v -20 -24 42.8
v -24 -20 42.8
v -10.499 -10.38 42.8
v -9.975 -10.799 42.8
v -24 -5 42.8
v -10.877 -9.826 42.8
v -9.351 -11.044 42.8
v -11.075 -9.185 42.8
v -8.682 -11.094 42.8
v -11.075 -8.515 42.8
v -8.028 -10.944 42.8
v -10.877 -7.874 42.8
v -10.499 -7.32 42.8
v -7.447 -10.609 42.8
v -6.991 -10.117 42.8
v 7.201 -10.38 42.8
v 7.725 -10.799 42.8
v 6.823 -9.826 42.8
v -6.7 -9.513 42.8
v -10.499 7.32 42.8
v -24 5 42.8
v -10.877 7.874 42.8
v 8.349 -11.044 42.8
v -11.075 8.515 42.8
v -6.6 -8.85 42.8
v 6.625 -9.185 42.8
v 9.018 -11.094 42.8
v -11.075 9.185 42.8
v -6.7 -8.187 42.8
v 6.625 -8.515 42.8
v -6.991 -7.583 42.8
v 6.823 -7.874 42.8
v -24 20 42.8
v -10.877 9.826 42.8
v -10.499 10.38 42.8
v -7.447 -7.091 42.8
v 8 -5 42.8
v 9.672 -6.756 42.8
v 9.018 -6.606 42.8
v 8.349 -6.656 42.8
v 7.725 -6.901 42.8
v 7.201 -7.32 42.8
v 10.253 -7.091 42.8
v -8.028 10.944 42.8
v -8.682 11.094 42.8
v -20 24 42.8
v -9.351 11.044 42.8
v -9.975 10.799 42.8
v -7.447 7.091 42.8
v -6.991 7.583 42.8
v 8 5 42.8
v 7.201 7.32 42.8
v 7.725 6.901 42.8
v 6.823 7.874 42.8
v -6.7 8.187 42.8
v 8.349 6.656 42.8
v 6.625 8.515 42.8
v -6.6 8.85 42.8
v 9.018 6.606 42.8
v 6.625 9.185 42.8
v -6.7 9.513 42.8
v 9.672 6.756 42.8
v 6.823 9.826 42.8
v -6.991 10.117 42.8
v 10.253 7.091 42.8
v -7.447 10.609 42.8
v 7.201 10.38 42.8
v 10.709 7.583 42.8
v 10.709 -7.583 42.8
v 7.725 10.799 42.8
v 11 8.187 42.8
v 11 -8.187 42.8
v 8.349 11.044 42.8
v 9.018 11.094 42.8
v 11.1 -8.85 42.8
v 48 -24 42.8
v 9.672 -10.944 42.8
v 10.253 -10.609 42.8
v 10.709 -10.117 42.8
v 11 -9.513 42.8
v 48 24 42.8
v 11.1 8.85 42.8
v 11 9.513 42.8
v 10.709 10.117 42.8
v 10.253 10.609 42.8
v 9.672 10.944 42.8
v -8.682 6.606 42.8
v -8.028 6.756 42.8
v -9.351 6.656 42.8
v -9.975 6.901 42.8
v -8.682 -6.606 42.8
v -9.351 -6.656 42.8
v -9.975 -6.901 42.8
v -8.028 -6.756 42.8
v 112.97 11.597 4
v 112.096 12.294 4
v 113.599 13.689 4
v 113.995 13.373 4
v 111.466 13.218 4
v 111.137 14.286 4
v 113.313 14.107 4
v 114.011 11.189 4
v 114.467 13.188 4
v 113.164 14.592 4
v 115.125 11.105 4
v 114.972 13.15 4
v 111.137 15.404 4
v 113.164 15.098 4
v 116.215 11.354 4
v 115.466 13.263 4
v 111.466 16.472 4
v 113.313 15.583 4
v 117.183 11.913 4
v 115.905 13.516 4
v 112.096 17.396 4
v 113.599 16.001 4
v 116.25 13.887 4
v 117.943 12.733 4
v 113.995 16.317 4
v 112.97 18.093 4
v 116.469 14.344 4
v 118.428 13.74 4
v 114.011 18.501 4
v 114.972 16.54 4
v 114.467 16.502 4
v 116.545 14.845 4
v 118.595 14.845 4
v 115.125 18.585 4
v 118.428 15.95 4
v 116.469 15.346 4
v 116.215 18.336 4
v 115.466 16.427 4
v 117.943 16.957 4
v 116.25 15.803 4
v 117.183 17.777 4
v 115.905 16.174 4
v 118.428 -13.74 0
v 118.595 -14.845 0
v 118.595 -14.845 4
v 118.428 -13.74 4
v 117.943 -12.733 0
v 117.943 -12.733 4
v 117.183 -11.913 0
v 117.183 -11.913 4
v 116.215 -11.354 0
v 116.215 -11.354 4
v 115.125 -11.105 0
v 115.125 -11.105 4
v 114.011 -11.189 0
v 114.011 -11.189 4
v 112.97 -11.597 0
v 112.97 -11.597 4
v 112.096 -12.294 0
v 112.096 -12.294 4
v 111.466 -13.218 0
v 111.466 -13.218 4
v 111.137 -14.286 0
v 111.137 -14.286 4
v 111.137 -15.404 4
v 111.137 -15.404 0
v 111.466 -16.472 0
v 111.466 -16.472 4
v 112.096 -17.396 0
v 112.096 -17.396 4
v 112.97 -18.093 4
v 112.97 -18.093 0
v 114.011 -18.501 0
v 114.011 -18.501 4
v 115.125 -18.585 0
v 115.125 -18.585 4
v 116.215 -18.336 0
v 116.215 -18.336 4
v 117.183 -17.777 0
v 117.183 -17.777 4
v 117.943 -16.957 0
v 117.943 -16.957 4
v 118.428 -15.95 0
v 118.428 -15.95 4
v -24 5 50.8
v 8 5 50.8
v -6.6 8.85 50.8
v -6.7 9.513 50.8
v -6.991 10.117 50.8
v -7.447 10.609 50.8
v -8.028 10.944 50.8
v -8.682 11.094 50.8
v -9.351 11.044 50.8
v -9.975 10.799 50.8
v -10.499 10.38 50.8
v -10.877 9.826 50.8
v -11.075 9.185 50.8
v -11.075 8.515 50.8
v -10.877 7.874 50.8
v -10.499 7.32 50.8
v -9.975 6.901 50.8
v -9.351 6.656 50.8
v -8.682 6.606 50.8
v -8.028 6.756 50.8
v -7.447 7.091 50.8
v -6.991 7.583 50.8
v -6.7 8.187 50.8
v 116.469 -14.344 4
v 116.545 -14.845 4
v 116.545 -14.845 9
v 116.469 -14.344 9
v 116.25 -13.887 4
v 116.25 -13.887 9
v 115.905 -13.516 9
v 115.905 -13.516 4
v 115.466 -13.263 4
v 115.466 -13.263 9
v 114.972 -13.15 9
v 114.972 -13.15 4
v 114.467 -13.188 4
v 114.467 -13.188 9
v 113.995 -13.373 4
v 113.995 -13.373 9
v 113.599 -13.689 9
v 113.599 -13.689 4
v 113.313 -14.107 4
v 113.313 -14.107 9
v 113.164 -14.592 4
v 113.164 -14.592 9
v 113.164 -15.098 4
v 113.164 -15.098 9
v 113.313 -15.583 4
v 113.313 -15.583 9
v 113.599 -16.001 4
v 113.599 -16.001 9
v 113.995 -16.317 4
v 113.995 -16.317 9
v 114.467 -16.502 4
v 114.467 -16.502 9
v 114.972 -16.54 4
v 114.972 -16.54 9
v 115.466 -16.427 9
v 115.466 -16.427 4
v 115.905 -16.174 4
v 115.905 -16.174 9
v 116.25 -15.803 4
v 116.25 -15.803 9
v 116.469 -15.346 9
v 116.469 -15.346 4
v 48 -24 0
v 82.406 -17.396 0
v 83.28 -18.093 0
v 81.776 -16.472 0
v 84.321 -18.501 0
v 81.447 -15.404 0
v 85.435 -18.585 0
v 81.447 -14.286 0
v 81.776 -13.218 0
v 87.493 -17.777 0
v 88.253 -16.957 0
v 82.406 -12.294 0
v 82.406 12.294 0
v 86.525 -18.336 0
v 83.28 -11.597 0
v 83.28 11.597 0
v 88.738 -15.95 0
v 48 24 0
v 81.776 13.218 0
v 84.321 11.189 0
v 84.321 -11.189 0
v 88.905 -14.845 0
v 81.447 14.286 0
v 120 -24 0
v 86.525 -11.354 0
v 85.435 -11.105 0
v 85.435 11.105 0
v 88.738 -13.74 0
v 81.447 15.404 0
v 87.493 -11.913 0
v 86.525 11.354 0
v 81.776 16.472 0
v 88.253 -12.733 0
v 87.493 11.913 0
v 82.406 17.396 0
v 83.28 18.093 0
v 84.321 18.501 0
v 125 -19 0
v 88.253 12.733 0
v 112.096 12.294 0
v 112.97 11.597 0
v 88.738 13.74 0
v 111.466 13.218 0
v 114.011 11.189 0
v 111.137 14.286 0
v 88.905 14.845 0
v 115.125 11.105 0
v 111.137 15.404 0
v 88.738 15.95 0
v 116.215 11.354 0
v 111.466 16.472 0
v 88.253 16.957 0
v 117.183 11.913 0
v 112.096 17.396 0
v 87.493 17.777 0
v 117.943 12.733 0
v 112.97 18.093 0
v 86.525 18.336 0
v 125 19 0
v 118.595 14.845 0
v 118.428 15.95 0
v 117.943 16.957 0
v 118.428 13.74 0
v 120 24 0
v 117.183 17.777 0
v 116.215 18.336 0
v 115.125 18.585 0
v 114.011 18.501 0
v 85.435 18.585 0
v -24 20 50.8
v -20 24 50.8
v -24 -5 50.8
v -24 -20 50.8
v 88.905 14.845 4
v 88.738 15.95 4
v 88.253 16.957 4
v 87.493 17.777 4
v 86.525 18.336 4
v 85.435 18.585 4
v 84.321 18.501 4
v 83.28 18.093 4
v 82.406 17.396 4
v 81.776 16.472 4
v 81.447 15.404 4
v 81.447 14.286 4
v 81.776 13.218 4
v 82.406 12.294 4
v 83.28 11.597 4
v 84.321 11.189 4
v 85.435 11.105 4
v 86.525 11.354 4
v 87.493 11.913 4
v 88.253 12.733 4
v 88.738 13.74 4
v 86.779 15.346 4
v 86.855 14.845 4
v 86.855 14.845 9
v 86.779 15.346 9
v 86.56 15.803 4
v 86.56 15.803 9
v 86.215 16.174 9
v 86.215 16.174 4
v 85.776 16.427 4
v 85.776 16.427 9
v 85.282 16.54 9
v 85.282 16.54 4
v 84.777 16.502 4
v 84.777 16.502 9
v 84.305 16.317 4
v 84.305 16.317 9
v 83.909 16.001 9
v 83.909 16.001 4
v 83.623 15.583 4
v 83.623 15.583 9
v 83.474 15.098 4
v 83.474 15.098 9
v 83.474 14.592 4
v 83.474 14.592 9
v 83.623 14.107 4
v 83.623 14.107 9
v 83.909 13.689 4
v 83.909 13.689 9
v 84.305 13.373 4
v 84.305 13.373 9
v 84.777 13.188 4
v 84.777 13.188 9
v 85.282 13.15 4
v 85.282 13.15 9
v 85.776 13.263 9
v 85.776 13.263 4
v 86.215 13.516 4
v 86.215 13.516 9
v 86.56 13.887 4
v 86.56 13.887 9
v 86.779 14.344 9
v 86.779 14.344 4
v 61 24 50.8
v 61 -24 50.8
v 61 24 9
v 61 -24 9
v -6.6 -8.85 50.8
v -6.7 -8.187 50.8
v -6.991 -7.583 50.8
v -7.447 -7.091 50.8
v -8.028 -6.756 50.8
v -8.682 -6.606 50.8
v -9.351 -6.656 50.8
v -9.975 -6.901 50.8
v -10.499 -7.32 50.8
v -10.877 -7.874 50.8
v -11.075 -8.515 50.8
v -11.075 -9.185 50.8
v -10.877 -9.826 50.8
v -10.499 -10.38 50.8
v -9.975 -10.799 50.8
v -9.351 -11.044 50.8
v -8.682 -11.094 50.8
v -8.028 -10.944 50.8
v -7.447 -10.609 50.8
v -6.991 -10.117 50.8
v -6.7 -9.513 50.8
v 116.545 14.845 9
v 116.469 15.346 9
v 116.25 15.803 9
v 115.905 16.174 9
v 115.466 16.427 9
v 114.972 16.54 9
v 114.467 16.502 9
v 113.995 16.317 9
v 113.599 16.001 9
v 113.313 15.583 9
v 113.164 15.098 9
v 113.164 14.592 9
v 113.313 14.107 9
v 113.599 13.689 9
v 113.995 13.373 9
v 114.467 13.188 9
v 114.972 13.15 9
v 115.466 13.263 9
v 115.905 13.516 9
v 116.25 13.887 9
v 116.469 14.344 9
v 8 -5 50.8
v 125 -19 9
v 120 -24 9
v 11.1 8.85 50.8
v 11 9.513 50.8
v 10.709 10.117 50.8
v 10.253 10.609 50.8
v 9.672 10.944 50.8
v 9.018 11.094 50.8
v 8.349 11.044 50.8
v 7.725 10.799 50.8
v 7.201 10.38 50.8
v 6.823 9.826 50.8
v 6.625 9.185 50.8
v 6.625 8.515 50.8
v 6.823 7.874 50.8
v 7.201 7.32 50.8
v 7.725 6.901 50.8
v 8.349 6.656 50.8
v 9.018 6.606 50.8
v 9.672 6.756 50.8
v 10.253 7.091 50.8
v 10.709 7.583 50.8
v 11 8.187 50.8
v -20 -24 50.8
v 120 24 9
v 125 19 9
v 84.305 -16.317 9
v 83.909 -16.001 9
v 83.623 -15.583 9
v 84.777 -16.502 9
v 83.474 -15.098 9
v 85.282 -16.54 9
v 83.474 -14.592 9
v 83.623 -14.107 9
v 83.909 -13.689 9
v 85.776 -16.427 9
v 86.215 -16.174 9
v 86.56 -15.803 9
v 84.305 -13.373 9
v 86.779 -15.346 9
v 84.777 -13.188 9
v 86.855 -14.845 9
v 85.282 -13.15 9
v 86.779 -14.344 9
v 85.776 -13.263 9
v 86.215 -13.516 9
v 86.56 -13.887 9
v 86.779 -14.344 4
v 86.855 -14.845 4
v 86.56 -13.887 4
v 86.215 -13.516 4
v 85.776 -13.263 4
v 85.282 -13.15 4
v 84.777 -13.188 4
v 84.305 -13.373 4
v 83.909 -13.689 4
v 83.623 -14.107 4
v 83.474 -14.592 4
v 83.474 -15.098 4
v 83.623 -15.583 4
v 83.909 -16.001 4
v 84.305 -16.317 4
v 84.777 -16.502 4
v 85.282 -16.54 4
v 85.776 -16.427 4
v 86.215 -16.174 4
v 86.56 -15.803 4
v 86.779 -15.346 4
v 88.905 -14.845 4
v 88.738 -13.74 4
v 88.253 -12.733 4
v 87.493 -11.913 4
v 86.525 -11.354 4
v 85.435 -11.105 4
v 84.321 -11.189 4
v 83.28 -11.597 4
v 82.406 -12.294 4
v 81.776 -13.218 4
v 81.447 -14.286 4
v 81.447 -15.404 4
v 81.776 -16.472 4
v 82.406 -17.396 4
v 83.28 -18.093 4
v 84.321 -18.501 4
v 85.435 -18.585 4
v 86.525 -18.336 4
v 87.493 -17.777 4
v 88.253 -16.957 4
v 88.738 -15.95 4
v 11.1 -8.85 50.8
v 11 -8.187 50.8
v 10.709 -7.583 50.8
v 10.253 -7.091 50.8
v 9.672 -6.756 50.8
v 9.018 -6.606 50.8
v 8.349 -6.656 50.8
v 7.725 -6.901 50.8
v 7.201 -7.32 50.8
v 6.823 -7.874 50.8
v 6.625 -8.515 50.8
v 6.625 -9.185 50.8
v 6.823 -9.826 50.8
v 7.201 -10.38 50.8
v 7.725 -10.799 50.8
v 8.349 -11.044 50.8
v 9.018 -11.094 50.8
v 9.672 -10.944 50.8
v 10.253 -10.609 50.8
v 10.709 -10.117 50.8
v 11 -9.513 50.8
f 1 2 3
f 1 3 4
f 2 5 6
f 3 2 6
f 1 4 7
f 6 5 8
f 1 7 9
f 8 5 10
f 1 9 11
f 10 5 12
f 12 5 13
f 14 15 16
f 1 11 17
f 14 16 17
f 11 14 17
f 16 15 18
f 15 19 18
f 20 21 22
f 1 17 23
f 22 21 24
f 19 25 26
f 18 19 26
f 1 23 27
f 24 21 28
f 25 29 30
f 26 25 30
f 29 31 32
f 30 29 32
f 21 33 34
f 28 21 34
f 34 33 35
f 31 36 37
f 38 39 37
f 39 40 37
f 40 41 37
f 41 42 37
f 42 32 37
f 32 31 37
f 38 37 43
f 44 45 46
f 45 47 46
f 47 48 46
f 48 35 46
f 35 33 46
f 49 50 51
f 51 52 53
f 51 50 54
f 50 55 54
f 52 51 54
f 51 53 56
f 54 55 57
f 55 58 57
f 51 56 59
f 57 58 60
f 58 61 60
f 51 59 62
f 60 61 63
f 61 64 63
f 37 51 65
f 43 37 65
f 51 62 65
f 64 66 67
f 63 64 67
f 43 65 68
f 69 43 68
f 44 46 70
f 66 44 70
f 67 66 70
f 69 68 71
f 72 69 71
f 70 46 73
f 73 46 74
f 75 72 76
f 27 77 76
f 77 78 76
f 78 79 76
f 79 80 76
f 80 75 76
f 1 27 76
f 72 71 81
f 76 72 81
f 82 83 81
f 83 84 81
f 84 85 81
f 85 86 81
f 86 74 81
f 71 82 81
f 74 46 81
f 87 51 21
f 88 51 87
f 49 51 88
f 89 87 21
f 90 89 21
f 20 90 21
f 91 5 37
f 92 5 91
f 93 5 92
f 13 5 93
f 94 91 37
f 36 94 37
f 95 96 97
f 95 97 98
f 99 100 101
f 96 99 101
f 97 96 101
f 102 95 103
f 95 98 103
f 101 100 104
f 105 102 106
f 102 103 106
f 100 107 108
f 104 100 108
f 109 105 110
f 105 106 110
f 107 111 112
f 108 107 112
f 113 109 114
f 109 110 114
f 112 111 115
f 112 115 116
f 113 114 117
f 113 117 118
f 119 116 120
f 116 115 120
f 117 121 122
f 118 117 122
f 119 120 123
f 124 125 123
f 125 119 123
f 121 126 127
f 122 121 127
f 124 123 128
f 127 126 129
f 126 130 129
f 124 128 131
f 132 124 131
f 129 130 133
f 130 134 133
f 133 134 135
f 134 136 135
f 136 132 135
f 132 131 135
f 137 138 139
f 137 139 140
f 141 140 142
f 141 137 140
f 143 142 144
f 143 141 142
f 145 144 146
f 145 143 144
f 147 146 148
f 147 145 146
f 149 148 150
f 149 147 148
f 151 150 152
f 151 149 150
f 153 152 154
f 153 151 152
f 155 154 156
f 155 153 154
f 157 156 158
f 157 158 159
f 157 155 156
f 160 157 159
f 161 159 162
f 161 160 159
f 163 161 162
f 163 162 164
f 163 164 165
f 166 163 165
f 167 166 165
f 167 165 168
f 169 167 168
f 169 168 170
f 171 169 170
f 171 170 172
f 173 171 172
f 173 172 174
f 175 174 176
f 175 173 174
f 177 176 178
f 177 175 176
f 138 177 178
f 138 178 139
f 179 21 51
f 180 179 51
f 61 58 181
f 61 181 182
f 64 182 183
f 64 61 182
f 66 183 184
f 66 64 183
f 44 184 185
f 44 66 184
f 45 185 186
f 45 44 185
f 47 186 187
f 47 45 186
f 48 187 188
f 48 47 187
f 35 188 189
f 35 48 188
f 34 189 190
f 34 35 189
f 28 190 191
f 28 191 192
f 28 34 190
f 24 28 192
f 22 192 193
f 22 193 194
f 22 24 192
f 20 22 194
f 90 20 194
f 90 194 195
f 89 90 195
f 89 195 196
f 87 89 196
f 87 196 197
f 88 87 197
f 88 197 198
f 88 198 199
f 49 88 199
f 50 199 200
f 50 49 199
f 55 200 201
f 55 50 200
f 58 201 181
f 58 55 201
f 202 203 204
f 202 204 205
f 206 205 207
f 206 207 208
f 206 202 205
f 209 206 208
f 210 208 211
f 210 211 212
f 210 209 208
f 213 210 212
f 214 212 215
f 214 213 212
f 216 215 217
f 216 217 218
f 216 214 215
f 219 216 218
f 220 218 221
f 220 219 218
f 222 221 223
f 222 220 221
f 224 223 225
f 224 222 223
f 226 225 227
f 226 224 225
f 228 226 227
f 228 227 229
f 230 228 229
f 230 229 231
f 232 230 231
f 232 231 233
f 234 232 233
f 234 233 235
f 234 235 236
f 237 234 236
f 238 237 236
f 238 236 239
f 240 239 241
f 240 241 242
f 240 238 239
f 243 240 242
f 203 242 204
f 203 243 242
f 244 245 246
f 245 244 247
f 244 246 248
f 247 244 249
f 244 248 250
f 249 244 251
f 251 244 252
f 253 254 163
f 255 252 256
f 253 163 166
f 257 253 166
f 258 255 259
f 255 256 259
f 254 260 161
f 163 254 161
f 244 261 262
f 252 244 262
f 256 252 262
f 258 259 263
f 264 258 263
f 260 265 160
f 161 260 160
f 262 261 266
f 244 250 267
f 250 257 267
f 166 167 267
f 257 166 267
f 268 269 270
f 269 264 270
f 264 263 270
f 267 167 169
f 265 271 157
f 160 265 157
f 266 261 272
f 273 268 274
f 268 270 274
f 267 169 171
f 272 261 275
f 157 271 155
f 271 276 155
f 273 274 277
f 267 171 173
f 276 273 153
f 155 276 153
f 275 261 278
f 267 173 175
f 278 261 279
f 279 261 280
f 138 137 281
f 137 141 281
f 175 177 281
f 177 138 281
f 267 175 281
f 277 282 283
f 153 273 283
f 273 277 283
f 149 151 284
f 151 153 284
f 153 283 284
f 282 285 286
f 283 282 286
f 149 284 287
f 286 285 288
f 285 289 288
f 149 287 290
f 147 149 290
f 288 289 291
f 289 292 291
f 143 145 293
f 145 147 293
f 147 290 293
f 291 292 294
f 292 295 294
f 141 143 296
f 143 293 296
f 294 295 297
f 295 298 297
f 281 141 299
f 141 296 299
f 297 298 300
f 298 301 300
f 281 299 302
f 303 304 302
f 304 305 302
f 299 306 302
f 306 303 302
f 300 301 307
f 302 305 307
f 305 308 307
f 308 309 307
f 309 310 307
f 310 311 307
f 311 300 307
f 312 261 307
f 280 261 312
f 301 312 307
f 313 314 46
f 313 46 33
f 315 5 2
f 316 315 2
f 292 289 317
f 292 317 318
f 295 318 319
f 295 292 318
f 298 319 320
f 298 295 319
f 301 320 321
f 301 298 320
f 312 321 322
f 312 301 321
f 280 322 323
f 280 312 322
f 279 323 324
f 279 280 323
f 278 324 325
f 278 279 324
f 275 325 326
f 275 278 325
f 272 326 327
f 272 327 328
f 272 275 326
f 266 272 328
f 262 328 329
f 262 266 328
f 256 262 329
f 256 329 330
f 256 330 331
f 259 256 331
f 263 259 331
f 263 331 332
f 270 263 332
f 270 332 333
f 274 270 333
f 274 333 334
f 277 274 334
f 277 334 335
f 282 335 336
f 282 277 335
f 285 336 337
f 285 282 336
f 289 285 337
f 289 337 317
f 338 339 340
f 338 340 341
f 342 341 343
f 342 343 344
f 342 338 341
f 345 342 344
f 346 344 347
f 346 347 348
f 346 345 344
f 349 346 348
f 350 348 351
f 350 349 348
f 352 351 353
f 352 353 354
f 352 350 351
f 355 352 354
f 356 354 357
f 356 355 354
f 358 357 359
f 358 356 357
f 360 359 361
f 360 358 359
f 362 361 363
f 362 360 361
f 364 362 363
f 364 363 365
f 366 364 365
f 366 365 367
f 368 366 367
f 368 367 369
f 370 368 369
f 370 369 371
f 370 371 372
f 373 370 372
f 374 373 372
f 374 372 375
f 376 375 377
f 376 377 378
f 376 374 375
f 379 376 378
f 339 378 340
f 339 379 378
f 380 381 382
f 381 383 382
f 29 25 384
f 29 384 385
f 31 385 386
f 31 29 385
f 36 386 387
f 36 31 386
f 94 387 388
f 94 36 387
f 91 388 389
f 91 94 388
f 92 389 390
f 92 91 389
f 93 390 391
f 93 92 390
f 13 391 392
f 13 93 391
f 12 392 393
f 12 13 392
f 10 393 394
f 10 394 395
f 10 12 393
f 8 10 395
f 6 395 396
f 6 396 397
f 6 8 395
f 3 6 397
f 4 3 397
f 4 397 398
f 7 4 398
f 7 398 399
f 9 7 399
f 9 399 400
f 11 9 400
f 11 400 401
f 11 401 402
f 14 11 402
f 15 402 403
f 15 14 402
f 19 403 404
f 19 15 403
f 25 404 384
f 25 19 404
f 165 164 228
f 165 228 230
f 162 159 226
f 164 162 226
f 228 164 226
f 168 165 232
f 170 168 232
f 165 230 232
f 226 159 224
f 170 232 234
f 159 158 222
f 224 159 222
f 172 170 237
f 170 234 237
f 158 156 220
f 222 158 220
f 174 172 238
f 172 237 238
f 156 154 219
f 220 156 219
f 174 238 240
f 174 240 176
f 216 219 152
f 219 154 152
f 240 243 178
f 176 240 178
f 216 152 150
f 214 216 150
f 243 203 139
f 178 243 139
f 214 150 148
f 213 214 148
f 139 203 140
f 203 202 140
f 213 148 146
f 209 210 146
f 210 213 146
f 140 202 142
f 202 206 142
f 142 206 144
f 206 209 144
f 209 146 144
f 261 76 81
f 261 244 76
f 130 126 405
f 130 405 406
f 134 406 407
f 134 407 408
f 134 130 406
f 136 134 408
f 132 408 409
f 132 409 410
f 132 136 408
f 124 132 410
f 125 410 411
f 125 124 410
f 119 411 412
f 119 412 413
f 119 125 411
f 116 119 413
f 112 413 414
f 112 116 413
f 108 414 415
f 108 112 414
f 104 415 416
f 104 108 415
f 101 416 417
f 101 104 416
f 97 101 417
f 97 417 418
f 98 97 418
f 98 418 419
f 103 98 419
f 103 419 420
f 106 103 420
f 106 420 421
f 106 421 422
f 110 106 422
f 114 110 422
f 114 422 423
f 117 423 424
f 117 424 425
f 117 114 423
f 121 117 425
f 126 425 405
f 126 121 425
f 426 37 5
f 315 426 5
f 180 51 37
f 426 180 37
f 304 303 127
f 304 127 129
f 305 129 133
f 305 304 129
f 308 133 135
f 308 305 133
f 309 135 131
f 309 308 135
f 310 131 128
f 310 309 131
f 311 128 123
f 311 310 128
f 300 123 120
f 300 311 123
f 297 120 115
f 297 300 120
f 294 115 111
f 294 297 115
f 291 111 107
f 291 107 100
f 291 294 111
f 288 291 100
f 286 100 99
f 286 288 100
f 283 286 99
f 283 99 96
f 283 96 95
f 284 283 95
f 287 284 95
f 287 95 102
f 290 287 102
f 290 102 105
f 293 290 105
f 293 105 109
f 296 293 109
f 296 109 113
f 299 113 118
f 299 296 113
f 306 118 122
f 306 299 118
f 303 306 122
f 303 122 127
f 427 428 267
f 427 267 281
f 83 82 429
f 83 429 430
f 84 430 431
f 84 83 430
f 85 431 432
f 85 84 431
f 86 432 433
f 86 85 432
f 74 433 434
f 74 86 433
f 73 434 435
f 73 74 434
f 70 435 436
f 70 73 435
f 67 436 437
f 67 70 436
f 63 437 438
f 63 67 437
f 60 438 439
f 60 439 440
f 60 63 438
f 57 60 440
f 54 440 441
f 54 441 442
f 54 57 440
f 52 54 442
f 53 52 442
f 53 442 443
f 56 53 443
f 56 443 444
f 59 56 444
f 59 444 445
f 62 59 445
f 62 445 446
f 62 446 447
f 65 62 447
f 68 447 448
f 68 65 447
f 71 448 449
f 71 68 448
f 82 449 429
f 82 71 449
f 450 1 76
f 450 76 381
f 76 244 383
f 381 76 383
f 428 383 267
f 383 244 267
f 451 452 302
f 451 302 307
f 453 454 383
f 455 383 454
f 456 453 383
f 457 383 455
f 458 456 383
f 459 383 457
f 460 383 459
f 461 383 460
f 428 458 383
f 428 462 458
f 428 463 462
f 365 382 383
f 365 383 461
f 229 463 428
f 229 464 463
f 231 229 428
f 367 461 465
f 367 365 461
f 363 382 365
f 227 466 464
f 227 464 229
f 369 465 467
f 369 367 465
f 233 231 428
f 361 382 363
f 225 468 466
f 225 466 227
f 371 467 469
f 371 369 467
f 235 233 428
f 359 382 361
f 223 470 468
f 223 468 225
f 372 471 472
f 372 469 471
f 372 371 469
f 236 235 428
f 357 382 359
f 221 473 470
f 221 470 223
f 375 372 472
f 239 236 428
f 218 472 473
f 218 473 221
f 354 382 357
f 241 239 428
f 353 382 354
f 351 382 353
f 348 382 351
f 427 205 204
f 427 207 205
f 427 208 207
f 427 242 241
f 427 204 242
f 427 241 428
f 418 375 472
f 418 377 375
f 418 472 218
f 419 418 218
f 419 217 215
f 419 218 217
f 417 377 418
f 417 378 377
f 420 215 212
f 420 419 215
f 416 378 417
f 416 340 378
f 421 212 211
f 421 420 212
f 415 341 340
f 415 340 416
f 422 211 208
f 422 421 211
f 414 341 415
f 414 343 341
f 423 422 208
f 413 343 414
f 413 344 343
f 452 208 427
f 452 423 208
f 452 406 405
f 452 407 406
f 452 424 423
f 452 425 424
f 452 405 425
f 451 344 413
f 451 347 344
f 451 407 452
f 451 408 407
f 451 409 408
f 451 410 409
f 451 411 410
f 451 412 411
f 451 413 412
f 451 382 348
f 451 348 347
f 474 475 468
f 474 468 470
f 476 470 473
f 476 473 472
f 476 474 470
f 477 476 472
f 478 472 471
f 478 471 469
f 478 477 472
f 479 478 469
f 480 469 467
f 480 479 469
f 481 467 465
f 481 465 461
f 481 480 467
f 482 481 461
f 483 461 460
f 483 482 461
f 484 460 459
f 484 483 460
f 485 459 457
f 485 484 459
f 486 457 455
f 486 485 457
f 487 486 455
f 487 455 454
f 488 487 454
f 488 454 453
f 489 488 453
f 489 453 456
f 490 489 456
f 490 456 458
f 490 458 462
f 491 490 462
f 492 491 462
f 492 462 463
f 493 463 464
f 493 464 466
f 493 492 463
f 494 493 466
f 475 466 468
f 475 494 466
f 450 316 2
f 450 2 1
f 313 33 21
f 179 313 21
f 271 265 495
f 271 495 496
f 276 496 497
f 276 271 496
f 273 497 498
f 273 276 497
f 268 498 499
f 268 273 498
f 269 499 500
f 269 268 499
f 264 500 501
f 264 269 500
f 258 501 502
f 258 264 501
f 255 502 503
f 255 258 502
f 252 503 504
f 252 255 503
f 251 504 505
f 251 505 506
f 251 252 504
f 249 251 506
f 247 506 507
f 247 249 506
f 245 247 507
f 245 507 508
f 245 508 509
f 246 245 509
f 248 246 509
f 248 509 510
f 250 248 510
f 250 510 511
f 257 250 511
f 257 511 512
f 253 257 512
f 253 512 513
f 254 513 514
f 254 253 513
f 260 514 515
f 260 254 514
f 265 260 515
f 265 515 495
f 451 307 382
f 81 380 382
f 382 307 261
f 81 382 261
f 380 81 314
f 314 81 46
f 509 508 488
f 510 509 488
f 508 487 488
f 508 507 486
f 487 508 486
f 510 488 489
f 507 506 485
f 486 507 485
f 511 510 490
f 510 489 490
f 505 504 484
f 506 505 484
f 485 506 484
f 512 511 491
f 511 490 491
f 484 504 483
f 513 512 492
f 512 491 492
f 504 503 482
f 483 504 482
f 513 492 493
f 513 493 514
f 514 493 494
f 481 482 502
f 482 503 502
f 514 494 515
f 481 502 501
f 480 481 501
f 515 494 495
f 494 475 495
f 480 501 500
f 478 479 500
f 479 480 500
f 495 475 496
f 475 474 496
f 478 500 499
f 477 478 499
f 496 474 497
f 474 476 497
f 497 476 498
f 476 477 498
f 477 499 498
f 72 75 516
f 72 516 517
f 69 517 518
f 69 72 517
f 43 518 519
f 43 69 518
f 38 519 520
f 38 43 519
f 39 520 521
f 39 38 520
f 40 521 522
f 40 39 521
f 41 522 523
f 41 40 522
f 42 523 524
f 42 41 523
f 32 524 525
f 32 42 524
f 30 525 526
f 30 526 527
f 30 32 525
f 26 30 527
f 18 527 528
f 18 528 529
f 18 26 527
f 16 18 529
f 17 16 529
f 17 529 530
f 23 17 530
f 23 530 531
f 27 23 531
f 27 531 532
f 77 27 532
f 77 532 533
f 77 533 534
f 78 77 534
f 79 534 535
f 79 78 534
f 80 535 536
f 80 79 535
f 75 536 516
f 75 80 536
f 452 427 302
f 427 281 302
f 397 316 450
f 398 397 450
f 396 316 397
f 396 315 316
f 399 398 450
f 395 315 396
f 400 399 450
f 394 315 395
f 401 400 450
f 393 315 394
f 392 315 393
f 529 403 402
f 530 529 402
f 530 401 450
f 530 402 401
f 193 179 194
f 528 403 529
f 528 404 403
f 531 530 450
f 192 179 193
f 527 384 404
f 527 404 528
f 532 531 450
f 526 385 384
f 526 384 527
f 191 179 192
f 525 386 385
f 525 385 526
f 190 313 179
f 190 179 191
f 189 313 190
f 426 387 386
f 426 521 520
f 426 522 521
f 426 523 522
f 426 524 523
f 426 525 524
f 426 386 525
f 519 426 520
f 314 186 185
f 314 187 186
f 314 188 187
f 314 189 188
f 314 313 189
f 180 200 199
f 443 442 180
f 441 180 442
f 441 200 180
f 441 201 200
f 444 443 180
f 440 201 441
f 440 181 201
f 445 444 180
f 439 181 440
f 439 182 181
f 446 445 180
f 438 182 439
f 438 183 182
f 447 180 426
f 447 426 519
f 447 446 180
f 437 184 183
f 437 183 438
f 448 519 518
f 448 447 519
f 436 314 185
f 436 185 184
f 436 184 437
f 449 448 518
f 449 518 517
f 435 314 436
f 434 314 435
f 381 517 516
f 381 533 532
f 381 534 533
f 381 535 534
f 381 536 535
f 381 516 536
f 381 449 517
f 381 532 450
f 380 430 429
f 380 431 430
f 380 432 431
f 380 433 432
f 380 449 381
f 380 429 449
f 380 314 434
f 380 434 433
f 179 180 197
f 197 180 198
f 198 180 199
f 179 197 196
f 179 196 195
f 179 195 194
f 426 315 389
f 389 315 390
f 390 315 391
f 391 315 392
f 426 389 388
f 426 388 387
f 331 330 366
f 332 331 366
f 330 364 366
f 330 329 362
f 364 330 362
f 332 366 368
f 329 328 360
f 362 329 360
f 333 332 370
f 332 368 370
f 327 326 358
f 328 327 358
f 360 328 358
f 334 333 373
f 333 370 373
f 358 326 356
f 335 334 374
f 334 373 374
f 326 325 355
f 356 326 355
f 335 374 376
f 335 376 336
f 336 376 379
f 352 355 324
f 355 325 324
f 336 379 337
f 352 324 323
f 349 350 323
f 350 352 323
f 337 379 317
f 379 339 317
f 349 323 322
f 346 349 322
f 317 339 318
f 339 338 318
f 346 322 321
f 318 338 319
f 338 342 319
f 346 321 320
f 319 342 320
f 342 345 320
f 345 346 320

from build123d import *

# Parameters (mm, degrees)
SKETCH_1_R        = 3.75
EXTRUDE_244_DEPTH = 4
EXTRUDE_START     = 4
SKETCH_2_R        = 1.7
EXTRUDE_328_DEPTH = 5
EXTRUDE_START_2   = 9
SKETCH_3_W        = 13
SKETCH_3_H        = 48
EXTRUDE_401_DEPTH = 33.8
EXTRUDE_START_3   = 42.8
SKETCH_4_R        = 2.25
EXTRUDE_499_DEPTH = 8


with BuildPart() as part:
    # 草图1 → Extrude 244 (new body)
    with BuildSketch(Plane.XY):
        Polygon((48, -24), (120, -24), (125, -19), (125, 19), (120, 24), (48, 24), align=None)
        with Locations((85.155, -14.845)):
            Circle(SKETCH_1_R, mode=Mode.SUBTRACT)
        with Locations((85.155, 14.845)):
            Circle(SKETCH_1_R, mode=Mode.SUBTRACT)
        with Locations((114.845, -14.845)):
            Circle(SKETCH_1_R, mode=Mode.SUBTRACT)
        with Locations((114.845, 14.845)):
            Circle(SKETCH_1_R, mode=Mode.SUBTRACT)
    extrude(amount=EXTRUDE_244_DEPTH)

    # 草图2 → Extrude 328 (add)
    with BuildSketch(Plane.XY.offset(EXTRUDE_START)):
        Polygon((48, -24), (120, -24), (125, -19), (125, 19), (120, 24), (48, 24), align=None)
        with Locations((85.155, -14.845)):
            Circle(SKETCH_2_R, mode=Mode.SUBTRACT)
        with Locations((85.155, 14.845)):
            Circle(SKETCH_2_R, mode=Mode.SUBTRACT)
        with Locations((114.845, -14.845)):
            Circle(SKETCH_2_R, mode=Mode.SUBTRACT)
        with Locations((114.845, 14.845)):
            Circle(SKETCH_2_R, mode=Mode.SUBTRACT)
    extrude(amount=EXTRUDE_328_DEPTH)

    # 草图3 → Extrude 401 (add)
    with BuildSketch(Plane.XY.offset(EXTRUDE_START_2)):
        with Locations((54.5, 0)):
            Rectangle(SKETCH_3_W, SKETCH_3_H)
    extrude(amount=EXTRUDE_401_DEPTH)

    # 草图4 → Extrude 499 (add)
    with BuildSketch(Plane.XY.offset(EXTRUDE_START_3)):
        Polygon((-24, -20), (-20, -24), (61, -24), (61, 24), (-20, 24), (-24, 20), (-24, 5), (8, 5), (8, -5), (-24, -5), align=None)
        with Locations((-8.85, -8.85)):
            Circle(SKETCH_4_R, mode=Mode.SUBTRACT)
        with Locations((-8.85, 8.85)):
            Circle(SKETCH_4_R, mode=Mode.SUBTRACT)
        with Locations((8.85, -8.85)):
            Circle(SKETCH_4_R, mode=Mode.SUBTRACT)
        with Locations((8.85, 8.85)):
            Circle(SKETCH_4_R, mode=Mode.SUBTRACT)
    extrude(amount=EXTRUDE_499_DEPTH)


solid = part.part
